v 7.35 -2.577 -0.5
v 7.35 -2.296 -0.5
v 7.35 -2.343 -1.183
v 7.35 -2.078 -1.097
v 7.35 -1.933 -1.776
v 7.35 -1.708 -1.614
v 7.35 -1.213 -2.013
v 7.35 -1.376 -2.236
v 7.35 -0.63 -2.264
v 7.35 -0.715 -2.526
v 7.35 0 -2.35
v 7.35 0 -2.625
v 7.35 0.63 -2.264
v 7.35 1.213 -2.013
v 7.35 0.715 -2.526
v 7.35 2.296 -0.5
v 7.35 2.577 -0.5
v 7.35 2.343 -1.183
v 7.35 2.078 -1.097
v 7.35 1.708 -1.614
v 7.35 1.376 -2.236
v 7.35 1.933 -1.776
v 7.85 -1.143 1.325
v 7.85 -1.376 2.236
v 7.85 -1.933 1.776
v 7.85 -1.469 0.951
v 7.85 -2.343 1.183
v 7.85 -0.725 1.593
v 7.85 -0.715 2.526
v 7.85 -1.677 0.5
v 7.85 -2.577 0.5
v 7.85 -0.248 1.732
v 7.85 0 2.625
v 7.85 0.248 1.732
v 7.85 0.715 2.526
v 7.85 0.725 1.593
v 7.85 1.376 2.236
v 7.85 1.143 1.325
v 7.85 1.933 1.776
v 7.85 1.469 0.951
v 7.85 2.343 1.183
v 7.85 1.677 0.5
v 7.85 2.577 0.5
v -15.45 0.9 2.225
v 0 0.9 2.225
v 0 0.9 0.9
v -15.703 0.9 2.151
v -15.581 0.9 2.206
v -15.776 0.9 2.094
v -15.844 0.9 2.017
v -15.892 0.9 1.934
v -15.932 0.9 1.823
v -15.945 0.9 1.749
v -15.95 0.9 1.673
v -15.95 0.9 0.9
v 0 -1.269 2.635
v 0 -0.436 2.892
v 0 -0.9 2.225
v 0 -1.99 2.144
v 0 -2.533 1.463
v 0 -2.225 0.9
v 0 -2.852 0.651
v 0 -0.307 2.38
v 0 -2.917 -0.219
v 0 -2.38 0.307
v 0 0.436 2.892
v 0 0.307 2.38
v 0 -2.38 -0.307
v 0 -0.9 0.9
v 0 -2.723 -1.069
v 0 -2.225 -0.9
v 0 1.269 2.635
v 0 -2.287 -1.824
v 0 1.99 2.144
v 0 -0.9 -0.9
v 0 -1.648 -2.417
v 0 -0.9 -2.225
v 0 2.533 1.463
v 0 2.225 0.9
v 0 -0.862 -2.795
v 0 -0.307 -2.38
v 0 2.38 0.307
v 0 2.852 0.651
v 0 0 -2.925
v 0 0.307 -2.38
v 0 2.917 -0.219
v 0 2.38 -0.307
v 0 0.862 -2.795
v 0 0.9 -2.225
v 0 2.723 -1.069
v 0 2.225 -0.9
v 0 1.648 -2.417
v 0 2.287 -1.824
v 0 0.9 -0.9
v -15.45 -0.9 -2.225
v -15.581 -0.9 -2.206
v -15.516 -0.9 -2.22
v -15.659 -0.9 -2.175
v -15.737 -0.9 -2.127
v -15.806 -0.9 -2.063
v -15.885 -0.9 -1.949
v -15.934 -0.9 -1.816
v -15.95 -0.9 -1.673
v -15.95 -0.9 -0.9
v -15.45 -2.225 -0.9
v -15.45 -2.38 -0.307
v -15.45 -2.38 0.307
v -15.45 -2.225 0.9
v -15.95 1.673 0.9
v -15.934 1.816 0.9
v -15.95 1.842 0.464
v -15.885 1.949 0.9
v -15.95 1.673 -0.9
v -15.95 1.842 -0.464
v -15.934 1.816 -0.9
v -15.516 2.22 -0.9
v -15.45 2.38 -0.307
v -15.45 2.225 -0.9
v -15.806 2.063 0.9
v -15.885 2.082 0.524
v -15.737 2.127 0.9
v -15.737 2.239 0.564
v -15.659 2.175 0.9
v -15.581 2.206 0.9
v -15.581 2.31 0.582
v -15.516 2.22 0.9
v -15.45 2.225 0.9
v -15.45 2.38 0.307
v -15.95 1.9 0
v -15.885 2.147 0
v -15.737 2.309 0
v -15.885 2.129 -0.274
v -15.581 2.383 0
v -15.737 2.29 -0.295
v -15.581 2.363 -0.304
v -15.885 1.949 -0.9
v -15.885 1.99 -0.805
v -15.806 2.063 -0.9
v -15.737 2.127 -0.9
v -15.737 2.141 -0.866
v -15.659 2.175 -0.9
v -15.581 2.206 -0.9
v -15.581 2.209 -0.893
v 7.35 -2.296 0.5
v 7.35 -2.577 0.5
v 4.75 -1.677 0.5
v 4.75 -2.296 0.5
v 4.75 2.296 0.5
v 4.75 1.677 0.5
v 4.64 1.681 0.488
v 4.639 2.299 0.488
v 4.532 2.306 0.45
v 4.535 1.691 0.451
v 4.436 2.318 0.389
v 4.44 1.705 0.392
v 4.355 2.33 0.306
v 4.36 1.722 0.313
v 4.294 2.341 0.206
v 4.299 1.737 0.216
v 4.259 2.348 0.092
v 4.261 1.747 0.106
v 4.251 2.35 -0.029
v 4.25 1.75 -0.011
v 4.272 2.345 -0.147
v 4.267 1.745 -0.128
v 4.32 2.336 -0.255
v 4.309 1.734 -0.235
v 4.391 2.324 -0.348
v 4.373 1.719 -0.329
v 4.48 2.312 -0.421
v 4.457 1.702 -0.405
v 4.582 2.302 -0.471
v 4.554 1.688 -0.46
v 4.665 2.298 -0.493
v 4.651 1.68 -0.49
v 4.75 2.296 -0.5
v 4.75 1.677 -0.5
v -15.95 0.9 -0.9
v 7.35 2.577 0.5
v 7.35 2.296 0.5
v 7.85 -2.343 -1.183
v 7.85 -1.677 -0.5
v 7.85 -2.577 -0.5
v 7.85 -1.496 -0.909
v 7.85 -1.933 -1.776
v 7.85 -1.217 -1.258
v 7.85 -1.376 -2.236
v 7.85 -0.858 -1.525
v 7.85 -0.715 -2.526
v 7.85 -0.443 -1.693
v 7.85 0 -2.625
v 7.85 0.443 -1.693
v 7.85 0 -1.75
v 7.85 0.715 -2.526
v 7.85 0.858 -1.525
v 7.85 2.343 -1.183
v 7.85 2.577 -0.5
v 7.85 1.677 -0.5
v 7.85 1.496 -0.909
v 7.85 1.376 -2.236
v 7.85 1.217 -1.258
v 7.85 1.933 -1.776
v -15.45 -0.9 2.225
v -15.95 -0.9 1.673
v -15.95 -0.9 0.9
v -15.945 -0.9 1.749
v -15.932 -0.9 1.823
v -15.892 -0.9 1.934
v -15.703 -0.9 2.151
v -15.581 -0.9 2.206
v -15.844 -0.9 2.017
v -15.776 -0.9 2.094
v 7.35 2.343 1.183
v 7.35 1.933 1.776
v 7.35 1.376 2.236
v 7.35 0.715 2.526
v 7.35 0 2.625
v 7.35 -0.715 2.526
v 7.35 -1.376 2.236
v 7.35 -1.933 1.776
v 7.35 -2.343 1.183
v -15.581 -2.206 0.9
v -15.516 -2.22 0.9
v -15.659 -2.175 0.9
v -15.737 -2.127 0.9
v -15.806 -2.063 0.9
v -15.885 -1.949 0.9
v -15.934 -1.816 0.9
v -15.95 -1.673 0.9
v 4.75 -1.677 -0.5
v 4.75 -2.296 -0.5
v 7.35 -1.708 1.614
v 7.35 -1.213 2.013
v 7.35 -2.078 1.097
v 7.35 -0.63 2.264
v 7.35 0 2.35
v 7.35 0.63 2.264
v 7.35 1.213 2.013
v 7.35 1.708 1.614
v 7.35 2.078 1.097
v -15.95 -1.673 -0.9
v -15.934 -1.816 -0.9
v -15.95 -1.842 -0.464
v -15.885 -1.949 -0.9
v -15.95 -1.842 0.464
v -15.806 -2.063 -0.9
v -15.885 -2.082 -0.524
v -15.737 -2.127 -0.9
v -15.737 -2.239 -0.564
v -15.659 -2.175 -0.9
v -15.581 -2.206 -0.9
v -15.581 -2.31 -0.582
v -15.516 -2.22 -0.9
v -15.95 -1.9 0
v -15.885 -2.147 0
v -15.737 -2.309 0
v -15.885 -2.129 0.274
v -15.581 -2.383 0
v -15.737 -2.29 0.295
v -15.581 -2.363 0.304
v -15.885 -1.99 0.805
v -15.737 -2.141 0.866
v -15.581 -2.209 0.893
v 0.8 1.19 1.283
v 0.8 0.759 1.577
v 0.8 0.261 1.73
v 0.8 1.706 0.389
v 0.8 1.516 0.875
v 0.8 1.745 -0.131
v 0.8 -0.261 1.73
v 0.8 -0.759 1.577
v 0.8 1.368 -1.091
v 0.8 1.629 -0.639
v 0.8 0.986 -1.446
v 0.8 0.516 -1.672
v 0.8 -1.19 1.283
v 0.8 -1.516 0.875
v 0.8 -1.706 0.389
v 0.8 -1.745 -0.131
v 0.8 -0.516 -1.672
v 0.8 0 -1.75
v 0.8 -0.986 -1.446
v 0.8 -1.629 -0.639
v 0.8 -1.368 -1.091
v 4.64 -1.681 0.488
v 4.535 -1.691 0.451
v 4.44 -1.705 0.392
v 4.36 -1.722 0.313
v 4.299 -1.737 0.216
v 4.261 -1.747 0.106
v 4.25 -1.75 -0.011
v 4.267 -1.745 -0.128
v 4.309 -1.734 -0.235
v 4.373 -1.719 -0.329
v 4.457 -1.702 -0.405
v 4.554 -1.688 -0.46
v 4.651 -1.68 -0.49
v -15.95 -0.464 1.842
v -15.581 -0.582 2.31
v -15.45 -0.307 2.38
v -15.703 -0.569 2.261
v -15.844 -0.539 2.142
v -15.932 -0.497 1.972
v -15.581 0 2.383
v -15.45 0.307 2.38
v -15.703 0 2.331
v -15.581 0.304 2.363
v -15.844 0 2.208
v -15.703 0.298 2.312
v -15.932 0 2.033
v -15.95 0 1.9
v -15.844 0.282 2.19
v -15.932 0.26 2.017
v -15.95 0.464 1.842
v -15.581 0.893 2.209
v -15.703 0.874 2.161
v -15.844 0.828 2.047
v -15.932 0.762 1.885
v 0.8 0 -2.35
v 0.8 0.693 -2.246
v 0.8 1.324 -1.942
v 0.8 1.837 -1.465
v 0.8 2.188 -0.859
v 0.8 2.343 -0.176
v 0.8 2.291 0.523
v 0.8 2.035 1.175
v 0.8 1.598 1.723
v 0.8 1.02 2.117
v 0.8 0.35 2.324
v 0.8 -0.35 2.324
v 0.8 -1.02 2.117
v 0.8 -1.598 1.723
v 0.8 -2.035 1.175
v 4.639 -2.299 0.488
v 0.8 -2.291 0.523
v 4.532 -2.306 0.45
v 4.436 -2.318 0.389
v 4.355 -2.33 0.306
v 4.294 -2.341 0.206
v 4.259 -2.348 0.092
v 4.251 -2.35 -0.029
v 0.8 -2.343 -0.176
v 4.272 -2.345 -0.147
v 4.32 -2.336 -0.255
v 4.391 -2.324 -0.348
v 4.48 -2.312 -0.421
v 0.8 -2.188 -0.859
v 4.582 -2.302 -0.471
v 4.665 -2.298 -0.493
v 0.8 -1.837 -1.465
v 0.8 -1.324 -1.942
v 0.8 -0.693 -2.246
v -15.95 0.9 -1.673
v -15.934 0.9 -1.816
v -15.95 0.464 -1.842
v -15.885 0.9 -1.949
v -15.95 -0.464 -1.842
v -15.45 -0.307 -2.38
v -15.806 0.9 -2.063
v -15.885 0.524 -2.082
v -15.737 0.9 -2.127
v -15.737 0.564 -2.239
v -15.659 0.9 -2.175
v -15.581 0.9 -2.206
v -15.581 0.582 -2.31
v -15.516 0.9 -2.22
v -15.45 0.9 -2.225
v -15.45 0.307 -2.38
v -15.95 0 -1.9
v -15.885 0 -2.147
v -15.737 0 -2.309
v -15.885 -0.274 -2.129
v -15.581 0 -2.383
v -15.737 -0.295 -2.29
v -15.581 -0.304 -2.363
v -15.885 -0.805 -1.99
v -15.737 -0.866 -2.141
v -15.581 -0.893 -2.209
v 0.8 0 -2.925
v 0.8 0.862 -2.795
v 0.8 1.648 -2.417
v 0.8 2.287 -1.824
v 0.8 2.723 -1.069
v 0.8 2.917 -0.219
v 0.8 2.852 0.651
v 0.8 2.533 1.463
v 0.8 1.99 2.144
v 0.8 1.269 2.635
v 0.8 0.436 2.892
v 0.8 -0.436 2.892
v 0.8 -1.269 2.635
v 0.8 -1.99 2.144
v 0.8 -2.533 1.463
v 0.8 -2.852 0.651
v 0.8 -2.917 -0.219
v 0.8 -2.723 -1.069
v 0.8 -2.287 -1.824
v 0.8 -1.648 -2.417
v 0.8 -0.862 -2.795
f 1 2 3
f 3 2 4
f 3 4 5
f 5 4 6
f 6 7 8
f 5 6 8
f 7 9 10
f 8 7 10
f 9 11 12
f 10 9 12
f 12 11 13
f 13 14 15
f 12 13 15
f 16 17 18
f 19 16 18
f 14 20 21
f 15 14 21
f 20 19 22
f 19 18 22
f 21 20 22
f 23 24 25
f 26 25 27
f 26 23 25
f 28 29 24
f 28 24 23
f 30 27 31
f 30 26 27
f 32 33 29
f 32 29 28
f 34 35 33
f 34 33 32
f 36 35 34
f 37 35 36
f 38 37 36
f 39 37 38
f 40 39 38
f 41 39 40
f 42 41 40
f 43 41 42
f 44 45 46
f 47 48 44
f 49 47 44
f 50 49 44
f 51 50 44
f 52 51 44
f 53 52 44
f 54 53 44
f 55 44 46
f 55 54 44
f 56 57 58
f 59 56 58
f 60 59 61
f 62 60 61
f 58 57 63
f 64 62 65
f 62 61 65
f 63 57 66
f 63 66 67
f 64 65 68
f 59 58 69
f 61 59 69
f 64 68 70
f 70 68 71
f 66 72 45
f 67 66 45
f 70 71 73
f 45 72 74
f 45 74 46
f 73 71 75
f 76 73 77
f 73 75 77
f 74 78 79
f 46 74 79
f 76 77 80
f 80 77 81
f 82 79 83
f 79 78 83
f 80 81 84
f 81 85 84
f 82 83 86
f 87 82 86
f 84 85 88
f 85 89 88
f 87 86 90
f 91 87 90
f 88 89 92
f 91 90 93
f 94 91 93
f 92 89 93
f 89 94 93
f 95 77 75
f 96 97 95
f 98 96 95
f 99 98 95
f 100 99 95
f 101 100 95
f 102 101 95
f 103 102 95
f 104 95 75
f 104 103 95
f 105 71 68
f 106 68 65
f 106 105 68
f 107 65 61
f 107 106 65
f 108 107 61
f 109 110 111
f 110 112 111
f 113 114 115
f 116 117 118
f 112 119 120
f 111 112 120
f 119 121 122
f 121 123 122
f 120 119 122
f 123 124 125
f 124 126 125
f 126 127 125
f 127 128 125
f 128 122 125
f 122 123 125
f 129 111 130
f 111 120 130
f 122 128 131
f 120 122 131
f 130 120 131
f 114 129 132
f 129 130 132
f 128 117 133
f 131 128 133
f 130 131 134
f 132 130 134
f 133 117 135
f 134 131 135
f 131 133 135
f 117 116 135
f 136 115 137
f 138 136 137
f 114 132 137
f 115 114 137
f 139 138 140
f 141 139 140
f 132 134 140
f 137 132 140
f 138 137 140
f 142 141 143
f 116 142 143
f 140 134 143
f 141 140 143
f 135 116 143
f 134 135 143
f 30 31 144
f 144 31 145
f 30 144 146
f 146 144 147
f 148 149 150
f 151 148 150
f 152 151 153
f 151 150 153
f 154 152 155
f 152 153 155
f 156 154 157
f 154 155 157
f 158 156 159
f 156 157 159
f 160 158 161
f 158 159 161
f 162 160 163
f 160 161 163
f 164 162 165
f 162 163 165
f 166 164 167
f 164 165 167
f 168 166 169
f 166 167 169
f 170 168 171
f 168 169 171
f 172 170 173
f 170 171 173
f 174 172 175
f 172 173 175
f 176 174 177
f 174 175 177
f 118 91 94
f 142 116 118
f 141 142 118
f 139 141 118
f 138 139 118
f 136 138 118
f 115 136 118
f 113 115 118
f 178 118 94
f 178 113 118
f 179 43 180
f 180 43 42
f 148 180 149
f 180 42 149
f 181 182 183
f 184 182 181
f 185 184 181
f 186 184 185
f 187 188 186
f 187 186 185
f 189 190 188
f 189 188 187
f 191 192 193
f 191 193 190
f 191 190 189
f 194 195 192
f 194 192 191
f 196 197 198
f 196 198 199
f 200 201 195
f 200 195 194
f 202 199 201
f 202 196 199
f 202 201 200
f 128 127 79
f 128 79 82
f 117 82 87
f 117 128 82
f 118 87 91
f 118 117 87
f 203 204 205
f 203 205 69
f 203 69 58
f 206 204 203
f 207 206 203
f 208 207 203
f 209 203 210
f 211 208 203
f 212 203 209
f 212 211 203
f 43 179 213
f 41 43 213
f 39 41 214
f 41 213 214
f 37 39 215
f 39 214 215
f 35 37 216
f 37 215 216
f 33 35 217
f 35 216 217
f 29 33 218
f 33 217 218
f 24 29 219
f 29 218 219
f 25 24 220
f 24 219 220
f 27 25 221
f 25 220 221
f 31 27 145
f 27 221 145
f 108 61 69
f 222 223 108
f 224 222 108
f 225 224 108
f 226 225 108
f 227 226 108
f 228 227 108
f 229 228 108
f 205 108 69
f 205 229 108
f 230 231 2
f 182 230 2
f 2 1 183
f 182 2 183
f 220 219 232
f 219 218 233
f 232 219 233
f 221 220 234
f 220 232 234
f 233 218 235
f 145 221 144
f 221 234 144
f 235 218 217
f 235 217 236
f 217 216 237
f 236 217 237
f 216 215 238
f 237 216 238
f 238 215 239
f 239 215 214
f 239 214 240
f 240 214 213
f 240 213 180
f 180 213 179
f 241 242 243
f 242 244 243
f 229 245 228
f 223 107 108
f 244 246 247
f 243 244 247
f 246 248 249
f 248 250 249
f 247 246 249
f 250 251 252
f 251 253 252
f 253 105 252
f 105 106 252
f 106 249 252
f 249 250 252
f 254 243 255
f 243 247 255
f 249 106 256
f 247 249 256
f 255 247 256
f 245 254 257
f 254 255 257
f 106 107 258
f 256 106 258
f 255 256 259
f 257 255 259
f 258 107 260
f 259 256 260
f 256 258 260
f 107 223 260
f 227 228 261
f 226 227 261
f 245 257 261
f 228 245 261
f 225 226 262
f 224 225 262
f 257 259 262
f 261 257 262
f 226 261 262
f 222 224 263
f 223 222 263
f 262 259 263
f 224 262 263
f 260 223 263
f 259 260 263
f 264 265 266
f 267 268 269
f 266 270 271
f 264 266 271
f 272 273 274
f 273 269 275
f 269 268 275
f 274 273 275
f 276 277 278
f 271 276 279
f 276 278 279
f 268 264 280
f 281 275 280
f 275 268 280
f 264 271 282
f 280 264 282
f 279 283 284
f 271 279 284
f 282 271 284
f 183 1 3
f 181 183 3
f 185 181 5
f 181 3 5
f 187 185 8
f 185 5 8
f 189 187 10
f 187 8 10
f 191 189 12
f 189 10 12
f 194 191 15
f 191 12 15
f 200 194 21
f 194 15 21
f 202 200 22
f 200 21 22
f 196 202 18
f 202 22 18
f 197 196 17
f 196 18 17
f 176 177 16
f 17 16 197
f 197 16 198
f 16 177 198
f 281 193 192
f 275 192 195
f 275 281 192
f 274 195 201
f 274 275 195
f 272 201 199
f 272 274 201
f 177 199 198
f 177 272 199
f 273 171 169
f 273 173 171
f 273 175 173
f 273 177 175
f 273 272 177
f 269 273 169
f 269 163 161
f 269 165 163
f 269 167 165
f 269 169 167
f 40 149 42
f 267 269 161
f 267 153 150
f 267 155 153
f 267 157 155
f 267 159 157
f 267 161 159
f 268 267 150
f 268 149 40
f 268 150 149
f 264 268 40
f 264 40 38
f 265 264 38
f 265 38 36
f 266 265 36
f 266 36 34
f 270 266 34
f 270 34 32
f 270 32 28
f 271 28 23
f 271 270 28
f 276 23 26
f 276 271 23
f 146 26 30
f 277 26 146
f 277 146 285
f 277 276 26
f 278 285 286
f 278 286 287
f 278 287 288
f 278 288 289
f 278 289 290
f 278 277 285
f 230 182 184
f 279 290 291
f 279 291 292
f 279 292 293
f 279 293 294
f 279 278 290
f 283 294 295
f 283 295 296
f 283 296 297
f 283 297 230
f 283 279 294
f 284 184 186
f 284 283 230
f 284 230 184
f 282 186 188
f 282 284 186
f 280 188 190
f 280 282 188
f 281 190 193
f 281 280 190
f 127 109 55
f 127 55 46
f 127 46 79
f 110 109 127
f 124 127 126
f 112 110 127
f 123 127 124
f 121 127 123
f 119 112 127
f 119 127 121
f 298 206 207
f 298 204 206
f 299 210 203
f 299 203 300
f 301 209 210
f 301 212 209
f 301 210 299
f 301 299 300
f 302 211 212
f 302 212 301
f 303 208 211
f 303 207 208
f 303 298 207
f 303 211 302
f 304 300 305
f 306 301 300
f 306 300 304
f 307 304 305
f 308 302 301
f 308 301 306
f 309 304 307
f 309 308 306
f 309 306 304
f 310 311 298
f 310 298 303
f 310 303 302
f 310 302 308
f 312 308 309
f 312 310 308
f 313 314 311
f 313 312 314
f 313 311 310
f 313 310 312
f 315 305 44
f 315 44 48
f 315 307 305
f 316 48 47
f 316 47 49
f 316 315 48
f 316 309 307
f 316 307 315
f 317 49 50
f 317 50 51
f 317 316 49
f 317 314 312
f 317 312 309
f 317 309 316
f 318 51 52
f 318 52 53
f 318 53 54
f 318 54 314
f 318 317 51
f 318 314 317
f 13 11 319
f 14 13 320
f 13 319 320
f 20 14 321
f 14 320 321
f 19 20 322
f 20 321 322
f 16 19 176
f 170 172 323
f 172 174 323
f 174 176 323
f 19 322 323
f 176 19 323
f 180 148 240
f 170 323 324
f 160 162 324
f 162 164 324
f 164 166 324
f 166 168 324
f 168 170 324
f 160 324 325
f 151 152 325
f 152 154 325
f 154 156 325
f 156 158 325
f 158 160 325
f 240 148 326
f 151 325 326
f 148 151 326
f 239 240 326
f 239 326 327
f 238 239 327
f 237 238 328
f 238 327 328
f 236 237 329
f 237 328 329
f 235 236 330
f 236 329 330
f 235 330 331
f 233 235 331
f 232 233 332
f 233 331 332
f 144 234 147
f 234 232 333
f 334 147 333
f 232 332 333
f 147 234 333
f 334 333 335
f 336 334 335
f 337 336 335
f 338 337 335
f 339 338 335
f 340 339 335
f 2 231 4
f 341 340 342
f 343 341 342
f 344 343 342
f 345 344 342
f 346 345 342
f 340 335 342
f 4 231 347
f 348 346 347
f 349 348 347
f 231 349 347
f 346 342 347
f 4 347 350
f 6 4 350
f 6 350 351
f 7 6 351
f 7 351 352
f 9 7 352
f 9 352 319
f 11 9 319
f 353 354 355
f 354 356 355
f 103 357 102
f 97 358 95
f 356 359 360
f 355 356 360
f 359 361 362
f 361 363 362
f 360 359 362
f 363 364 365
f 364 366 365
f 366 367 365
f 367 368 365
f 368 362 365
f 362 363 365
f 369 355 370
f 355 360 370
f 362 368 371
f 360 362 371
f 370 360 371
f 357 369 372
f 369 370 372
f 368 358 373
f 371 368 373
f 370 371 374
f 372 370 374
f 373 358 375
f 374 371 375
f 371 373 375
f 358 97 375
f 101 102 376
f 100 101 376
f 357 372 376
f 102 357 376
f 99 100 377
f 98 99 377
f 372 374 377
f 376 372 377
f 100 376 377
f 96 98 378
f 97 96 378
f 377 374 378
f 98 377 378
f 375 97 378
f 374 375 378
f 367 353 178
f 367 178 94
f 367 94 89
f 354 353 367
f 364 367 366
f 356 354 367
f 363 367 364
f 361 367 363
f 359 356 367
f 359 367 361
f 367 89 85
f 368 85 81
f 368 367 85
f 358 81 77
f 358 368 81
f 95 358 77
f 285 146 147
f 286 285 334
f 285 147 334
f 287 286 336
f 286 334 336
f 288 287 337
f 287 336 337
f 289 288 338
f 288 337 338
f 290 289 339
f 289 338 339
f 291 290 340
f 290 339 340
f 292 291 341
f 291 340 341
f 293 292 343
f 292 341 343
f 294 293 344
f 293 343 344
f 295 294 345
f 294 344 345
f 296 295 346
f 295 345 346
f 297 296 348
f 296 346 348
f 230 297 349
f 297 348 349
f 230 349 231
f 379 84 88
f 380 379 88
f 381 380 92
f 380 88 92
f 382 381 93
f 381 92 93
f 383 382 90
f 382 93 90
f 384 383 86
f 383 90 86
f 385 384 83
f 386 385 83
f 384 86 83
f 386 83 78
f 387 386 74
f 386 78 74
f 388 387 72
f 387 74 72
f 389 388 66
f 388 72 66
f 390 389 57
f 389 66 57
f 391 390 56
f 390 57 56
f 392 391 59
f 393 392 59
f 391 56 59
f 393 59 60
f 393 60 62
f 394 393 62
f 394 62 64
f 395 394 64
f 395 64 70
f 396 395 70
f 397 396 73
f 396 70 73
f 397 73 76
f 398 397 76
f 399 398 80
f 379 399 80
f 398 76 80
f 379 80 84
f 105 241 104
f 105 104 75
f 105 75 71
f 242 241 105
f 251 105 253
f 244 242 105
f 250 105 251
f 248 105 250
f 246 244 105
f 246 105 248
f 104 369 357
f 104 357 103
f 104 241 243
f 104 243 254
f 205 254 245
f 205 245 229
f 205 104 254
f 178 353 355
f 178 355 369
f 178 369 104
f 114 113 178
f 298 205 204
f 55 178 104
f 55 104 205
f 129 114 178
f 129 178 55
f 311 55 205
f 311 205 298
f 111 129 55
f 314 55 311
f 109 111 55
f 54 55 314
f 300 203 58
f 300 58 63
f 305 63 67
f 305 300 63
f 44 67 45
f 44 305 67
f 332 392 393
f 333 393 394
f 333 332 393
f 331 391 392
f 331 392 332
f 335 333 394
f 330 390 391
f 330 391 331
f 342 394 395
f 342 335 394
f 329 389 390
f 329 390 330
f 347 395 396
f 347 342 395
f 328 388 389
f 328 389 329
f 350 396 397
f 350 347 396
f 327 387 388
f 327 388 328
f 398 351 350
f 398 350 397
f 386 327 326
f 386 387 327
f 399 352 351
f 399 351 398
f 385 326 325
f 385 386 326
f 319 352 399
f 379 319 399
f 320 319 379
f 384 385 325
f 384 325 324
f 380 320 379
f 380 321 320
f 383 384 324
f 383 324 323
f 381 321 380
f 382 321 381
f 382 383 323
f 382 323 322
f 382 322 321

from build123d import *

# Parameters (mm, degrees)
SKETCH1_R             = 2.925
SKETCH1_R_2           = 1.7499999999999998
MIDDLE_RING_DEPTH     = 0.8
SKETCH2_R             = 2.35
SKETCH2_R_2           = 1.7499999999999998
OUTER_BODY_DEPTH      = 7.35
SKETCH3_R             = 2.625
SKETCH3_R_2           = 1.7499999999999998
OUTER_RIM_DEPTH       = 0.5
SIDE_SLOTS_DEPTH      = 9.873204043636097
SIDE_SLOTS_DEPTH_BACK = 9.873204043636097
AXLE_START            = 15.95
AXLE_DEPTH            = 15.95
FILLET1_R             = 0.5
SKETCH7_R             = 2.925
AXLE_BASE_DEPTH       = 0.8


with BuildPart() as part:
    # Sketch1 → Middle Ring (new body)
    with BuildSketch(Plane(origin=(0, 0, 0), x_dir=(0, 0, -1), z_dir=(1, 0, 0))):
        Circle(SKETCH1_R)
        Circle(SKETCH1_R_2, mode=Mode.SUBTRACT)
    extrude(amount=MIDDLE_RING_DEPTH)

    # Sketch2 → Outer Body (add)
    with BuildSketch(Plane(origin=(0, 0, 0), x_dir=(0, 0, -1), z_dir=(1, 0, 0))):
        Circle(SKETCH2_R)
        Circle(SKETCH2_R_2, mode=Mode.SUBTRACT)
    extrude(amount=OUTER_BODY_DEPTH)

    # Sketch3 → Outer Rim (add)
    with BuildSketch(Plane(origin=(7.35, 0, 0), x_dir=(0, 0, -1), z_dir=(1, 0, 0))):
        Circle(SKETCH3_R)
        Circle(SKETCH3_R_2, mode=Mode.SUBTRACT)
    extrude(amount=OUTER_RIM_DEPTH)

    # Sketch5 → Side Slots (cut, two sides: drawn at the far end of the back side and taken through both)
    with BuildSketch(Plane(origin=(0, 0, 0), x_dir=(1, 0, 0), z_dir=(0, 1, 0)).offset(-SIDE_SLOTS_DEPTH_BACK)):
        with BuildLine():
            Line((10.949999999999998, -0.4999999999999999), (4.750000000000001, -0.4999999999999999))
            ThreePointArc((4.750000000000001, -0.4999999999999999), (4.250000000000006, 6e-17), (4.750000000000001, 0.4999999999999945))
            Line((4.750000000000001, 0.4999999999999945), (10.949999999999998, 0.4999999999999945))
            ThreePointArc((10.949999999999998, 0.4999999999999945), (11.449999999999998, 0), (10.949999999999998, -0.4999999999999999))
        make_face()
        with BuildLine():
            Line((-10.949999999999998, -0.4999999999999999), (-4.750000000000001, -0.4999999999999999))
            ThreePointArc((-4.750000000000001, -0.4999999999999999), (-4.250000000000006, 0), (-4.750000000000001, 0.4999999999999945))
            Line((-4.750000000000001, 0.4999999999999945), (-10.949999999999998, 0.4999999999999945))
            ThreePointArc((-10.949999999999998, 0.4999999999999945), (-11.449999999999998, -6e-17), (-10.949999999999998, -0.4999999999999999))
        make_face()
    extrude(amount=SIDE_SLOTS_DEPTH + SIDE_SLOTS_DEPTH_BACK, mode=Mode.SUBTRACT)

    # Sketch6 → Axle (add)
    with BuildSketch(Plane.ZY.offset(AXLE_START)):
        Polygon((-0.8999999999999999, -0.8999999999999999), (0.9000000000000001, -0.8999999999999999), (0.9000000000000001, 0.8999999999999999), (-0.8999999999999999, 0.9), align=None)
        with BuildLine():
            Line((-1.5008331019803216, -0.8999999999999999), (-0.8999999999999999, -0.8999999999999999))
            Line((-0.8999999999999999, -0.8999999999999999), (-0.8999999999999999, 0.8999999999999999))
            Line((-0.8999999999999999, 0.9), (-1.5008331019803216, 0.9))
            ThreePointArc((-1.500833101980337, 0.9000000000000439), (-1.7499999999999998, 2.1e-16), (-1.5008331019803371, -0.9000000000000435))
        make_face()
        with BuildLine():
            Line((-0.8999999999999999, 0.9), (0.9000000000000001, 0.9))
            Line((0.9000000000000001, 0.8999999999999999), (0.9000000000000001, 1.5008331019803842))
            ThreePointArc((0.8999999999999783, 1.5008331019803764), (-1.233e-14, 1.7499999999999998), (-0.8999999999999996, 1.5008331019803633))
            Line((-0.8999999999999999, 1.5008331019803633), (-0.8999999999999999, 0.8999999999999999))
        make_face()
        with BuildLine():
            Line((1.5008331019803591, -0.8999999999999999), (2.2248595461286844, -0.8999999999999999))
            ThreePointArc((2.22485954612869, -0.9000000000000218), (2.3558080259975402, -0.458441429896527), (2.4, -5.9e-16))
            ThreePointArc((2.4, 0), (2.3558080259975402, 0.45844142989652675), (2.2248595461286897, 0.9000000000000221))
            Line((2.224859546128683, 0.9), (1.5008331019803582, 0.9))
            ThreePointArc((1.5008331019803602, 0.900000000000005), (1.6865583192504239, 0.46692722748538085), (1.7499999999999998, 0))
            ThreePointArc((1.7499999999999998, -4.3e-16), (1.6865583192504237, -0.46692722748538135), (1.500833101980361, -0.900000000000004))
        make_face()
        with BuildLine():
            ThreePointArc((-2.4, 2.9e-16), (-2.3558080259975434, -0.45844142989651143), (-2.2248595461287017, -0.8999999999999924))
            Line((-2.224859546128704, -0.8999999999999999), (-1.5008331019803216, -0.8999999999999999))
            ThreePointArc((-1.5008331019803371, -0.9000000000000435), (-1.7499999999999998, 2.1e-16), (-1.500833101980337, 0.9000000000000439))
            Line((-1.5008331019803216, 0.9), (-2.224859546128704, 0.9))
            ThreePointArc((-2.2248595461287013, 0.899999999999994), (-2.355808025997543, 0.458441429896512), (-2.4, 2.9e-16))
        make_face()
        with BuildLine():
            ThreePointArc((-0.9000000000000059, -2.2248595461286964), (-0.4584414298964598, -2.355808025997553), (1.168e-13, -2.4))
            ThreePointArc((1.168e-13, -2.4), (0.45844142989653847, -2.355808025997538), (0.8999999999999359, -2.224859546128725))
            Line((0.9000000000000001, -2.224859546128744), (0.9000000000000001, -1.5008331019803836))
            ThreePointArc((0.899999999999978, -1.5008331019803764), (-1.276e-14, -1.7499999999999998), (-0.8999999999999986, -1.500833101980364))
            Line((-0.8999999999999999, -1.5008331019803647), (-0.8999999999999999, -2.2248595461286946))
        make_face()
        with BuildLine():
            ThreePointArc((-0.8999999999999996, 1.5008331019803633), (-1.233e-14, 1.7499999999999998), (0.8999999999999783, 1.5008331019803764))
            Line((0.9000000000000001, 1.5008331019803842), (0.9000000000000001, 2.2248595461287435))
            ThreePointArc((0.899999999999937, 2.2248595461287244), (0.4584414298965443, 2.355808025997537), (1.2698e-13, 2.4))
            ThreePointArc((1.2698e-13, 2.4), (-0.4584414298964561, 2.355808025997554), (-0.9000000000000058, 2.2248595461286964))
            Line((-0.8999999999999999, 2.2248595461286946), (-0.8999999999999999, 1.5008331019803633))
        make_face()
        with BuildLine():
            Line((0.9000000000000001, 0.8999999999999999), (0.9000000000000001, -0.8999999999999999))
            Line((0.9000000000000001, -0.8999999999999999), (1.5008331019803591, -0.8999999999999999))
            ThreePointArc((1.500833101980361, -0.900000000000004), (1.6865583192504237, -0.46692722748538135), (1.7499999999999998, -4.3e-16))
            ThreePointArc((1.7499999999999998, 0), (1.6865583192504239, 0.46692722748538085), (1.5008331019803602, 0.900000000000005))
            Line((1.5008331019803582, 0.9), (0.9000000000000001, 0.9))
        make_face()
        with BuildLine():
            ThreePointArc((-0.8999999999999986, -1.500833101980364), (-1.276e-14, -1.7499999999999998), (0.899999999999978, -1.5008331019803764))
            Line((0.9000000000000001, -1.5008331019803836), (0.9000000000000001, -0.8999999999999999))
            Line((0.9000000000000001, -0.8999999999999999), (-0.8999999999999999, -0.8999999999999999))
            Line((-0.8999999999999999, -0.8999999999999999), (-0.8999999999999999, -1.5008331019803647))
        make_face()
    extrude(amount=-AXLE_DEPTH)

    # Fillet1
    fillet1_edges = [part.edges().sort_by_distance(p)[0] for p in [
        (-15.95, -2.4, -2.377e-14),
        (-15.95, 7.1e-16, -2.4000000000000004),
        (-15.95, 2.4000000000000004, -2.279e-14),
        (-15.95, -1.1e-16, 2.4000000000000004),
    ]]
    fillet(fillet1_edges, radius=FILLET1_R)

    # Sketch7 → Axle Base (add)
    with BuildSketch(Plane.ZY):
        with Locations(Location((0, 0, 0), (0, 0, 180))):
            Circle(SKETCH7_R)
    extrude(amount=-AXLE_BASE_DEPTH)


solid = part.part
